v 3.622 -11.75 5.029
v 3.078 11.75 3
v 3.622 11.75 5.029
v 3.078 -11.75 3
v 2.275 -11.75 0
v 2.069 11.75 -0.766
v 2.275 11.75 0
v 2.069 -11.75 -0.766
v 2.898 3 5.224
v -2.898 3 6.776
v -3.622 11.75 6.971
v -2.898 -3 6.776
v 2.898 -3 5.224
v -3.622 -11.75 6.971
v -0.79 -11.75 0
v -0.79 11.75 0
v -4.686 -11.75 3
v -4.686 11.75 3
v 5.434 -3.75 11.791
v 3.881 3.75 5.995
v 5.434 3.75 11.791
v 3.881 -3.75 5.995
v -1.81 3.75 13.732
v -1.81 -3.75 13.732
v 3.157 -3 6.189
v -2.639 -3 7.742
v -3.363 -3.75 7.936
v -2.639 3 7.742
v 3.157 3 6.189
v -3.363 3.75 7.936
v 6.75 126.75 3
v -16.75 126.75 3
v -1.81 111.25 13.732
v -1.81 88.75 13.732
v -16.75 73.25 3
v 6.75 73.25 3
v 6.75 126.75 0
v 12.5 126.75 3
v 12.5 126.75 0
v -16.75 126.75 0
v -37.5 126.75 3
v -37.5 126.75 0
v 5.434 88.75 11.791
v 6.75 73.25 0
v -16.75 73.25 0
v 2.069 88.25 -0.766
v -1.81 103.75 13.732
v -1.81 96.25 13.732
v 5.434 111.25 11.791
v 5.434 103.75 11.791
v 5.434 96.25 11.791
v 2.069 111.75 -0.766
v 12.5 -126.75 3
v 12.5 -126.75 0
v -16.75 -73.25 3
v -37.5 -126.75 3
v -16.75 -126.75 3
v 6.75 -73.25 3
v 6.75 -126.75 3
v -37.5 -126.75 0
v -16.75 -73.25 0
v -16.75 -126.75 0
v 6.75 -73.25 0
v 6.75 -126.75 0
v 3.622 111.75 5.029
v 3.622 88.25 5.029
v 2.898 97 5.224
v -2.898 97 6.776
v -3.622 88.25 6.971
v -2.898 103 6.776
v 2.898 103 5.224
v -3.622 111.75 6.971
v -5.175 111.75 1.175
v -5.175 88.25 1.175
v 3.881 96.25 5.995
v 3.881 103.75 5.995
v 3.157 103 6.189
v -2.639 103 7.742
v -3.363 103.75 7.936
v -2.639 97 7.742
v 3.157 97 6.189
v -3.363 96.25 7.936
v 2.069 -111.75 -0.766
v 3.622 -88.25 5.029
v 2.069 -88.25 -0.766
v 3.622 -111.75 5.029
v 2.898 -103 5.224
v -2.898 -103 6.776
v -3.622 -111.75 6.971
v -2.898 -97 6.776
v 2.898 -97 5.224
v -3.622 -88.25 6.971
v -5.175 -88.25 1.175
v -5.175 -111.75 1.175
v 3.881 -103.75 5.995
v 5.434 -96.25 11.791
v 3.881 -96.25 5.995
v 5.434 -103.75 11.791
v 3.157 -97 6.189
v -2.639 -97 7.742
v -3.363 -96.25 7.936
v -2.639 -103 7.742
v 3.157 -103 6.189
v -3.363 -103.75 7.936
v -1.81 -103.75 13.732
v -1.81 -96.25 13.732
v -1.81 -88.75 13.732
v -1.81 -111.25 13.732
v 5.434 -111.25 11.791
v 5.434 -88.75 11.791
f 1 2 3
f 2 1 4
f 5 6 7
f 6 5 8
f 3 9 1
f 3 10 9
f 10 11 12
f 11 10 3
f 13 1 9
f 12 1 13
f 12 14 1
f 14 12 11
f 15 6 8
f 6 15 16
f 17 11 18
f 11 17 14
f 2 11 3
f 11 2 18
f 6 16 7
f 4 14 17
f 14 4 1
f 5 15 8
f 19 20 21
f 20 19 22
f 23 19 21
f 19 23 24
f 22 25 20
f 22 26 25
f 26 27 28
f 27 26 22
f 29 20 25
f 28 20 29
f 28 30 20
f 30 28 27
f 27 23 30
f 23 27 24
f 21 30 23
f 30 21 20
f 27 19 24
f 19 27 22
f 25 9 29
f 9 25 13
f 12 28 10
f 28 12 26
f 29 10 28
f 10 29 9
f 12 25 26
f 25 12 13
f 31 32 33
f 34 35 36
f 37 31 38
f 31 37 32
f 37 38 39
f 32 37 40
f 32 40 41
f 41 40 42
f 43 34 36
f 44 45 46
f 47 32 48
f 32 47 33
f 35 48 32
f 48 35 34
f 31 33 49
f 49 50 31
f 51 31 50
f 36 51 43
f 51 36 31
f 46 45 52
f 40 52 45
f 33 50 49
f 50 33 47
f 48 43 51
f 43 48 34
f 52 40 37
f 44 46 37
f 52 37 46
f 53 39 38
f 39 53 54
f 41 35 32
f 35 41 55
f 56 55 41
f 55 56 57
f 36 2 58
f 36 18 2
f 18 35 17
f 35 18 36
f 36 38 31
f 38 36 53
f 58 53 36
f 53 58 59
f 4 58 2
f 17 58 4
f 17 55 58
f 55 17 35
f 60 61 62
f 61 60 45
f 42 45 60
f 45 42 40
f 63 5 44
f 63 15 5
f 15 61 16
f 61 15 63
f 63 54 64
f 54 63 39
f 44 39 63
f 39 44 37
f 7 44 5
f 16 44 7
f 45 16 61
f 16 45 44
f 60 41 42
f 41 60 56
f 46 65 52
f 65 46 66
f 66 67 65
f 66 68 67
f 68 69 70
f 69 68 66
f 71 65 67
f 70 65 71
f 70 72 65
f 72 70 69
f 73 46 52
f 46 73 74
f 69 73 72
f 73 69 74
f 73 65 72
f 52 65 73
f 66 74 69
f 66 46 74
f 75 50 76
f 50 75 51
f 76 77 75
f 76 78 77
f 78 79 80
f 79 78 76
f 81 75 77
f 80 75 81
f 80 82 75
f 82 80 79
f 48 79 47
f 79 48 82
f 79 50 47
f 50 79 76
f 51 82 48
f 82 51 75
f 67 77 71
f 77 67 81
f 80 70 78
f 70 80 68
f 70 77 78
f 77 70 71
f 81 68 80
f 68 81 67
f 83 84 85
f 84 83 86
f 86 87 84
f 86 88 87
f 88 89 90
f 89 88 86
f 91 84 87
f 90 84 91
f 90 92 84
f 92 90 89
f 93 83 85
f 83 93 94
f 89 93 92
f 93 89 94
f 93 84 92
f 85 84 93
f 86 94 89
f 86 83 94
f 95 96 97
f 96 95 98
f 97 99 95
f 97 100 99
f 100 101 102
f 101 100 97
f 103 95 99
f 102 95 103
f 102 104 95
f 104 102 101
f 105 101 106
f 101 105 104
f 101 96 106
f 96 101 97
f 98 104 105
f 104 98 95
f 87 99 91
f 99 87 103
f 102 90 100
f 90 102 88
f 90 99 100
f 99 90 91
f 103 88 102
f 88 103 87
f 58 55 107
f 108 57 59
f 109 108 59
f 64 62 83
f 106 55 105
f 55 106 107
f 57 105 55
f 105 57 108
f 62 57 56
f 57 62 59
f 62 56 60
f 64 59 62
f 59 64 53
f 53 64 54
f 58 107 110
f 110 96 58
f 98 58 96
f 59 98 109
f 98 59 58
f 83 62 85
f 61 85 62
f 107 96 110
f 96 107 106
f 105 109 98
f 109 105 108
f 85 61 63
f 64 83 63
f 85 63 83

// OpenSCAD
$fn = 10 ;
e = 3 ;

cny70_x = 7.5 ;
cny70_y = 7.5 ;
cny70_z = 6.0 ;
cny70_patte_x = 5.5 ;
cny70_patte_y = 5.5 ;
cny70_patte_z = 8 ;
cny70_fil_e = 2 ;

cny70_capsule_x = cny70_x + 2*e ;
cny70_capsule_y = cny70_y + 2*e ;
cny70_capsule_z = cny70_z + cny70_patte_z + cny70_fil_e  ;

fil_d = 3.8;
lien_l = 3 ;
lien_e = 1.5 ;
a = 15 ;

capteur_dy = 100 ;
capteur_y = 40;
capteur_x = 10 ;
plateau_x = 50 ;
module cny70(ep)
{
     // pattes
    translate([0,0,-3])
        cube([cny70_x,cny70_y + 2 * cny70_patte_z ,6],center = true);
    // fil
    *translate([0,0,fil_d/2])
        rotate([90,0,0])
            cylinder(d=fil_d,h=15,center=true);
   // capteur
    translate([0,0,cny70_z/2+1 ])
        cube([cny70_x,cny70_y+ep,cny70_z],center = true);
    translate([0,0,0.5])
        cube([cny70_x-1.5,cny70_y-1.5,1],center = true);

}
module decoupe_cny70(sens)
{
    // pattes
    translate([0,0,fil_d/2])
        cube([cny70_x,cny70_y + 2 * cny70_patte_z ,fil_d],center = true);
    // fil
    *translate([0,sens*30,fil_d/2])
        rotate([90,0,0])
            cylinder(d=fil_d,h=60,center=true);
    *translate([0,sens*30,fil_d/2])
        cube([fil_d,60,10],center=true);
   // capteur
                translate([0,0,2*e ]) 
                    rotate([0 , a  ,0]) 
                        cny70(15) ;
    translate([0,0,cny70_z/2 + fil_d+2])
        cube([cny70_x,cny70_y,cny70_z],center = true);
    *translate([5,0,cny70_z/2 + fil_d + 1])
        cube([cny70_x+10,cny70_y,cny70_z],center = true);
    *translate([5,0,fil_d + 1/2])
        cube([cny70_x-1.5+10,cny70_y-1.5,1],center = true);
   
}
module capteur(sens)
{
    
    difference() {
        union()
        {
            hull() {
                translate([0,0,2*e  ]) 
                    rotate([0 , a  ,0]) 
                        cny70(15) ;
                translate([-capteur_x/2,0,e/2])
                    cube([cny70_capsule_x + capteur_x ,cny70_capsule_y + capteur_y ,e],center = true);   
                }
            translate([-plateau_x/4,sens*(capteur_dy)/2,e/2])
                cube([plateau_x ,capteur_dy+cny70_capsule_y+capteur_y,e],center=true);
        }
       translate([0,0,2*e ]) 
        rotate([0 , a  ,0]) 
            cny70(0) ;

        *translate([0,0,e ]) 
            rotate([0 , a  ,0]) 
                decoupe_cny70(sens) ;
    }
}

module complet()
{
    translate([0,capteur_dy,0])
        capteur(-1);
    translate([0,-capteur_dy,0])
        capteur(1);
    *translate([-plateau_x/4,0,e/2])
        cube([plateau_x ,2*capteur_dy+cny70_capsule_y+capteur_y,e],center=true);
}

//rotate( [0,-90+a,0])
    complet();
translate([0,0,2*e ]) 
    rotate([0 , a  ,0]) 
        cny70(0) ;
*decoupe_cny70() ;
